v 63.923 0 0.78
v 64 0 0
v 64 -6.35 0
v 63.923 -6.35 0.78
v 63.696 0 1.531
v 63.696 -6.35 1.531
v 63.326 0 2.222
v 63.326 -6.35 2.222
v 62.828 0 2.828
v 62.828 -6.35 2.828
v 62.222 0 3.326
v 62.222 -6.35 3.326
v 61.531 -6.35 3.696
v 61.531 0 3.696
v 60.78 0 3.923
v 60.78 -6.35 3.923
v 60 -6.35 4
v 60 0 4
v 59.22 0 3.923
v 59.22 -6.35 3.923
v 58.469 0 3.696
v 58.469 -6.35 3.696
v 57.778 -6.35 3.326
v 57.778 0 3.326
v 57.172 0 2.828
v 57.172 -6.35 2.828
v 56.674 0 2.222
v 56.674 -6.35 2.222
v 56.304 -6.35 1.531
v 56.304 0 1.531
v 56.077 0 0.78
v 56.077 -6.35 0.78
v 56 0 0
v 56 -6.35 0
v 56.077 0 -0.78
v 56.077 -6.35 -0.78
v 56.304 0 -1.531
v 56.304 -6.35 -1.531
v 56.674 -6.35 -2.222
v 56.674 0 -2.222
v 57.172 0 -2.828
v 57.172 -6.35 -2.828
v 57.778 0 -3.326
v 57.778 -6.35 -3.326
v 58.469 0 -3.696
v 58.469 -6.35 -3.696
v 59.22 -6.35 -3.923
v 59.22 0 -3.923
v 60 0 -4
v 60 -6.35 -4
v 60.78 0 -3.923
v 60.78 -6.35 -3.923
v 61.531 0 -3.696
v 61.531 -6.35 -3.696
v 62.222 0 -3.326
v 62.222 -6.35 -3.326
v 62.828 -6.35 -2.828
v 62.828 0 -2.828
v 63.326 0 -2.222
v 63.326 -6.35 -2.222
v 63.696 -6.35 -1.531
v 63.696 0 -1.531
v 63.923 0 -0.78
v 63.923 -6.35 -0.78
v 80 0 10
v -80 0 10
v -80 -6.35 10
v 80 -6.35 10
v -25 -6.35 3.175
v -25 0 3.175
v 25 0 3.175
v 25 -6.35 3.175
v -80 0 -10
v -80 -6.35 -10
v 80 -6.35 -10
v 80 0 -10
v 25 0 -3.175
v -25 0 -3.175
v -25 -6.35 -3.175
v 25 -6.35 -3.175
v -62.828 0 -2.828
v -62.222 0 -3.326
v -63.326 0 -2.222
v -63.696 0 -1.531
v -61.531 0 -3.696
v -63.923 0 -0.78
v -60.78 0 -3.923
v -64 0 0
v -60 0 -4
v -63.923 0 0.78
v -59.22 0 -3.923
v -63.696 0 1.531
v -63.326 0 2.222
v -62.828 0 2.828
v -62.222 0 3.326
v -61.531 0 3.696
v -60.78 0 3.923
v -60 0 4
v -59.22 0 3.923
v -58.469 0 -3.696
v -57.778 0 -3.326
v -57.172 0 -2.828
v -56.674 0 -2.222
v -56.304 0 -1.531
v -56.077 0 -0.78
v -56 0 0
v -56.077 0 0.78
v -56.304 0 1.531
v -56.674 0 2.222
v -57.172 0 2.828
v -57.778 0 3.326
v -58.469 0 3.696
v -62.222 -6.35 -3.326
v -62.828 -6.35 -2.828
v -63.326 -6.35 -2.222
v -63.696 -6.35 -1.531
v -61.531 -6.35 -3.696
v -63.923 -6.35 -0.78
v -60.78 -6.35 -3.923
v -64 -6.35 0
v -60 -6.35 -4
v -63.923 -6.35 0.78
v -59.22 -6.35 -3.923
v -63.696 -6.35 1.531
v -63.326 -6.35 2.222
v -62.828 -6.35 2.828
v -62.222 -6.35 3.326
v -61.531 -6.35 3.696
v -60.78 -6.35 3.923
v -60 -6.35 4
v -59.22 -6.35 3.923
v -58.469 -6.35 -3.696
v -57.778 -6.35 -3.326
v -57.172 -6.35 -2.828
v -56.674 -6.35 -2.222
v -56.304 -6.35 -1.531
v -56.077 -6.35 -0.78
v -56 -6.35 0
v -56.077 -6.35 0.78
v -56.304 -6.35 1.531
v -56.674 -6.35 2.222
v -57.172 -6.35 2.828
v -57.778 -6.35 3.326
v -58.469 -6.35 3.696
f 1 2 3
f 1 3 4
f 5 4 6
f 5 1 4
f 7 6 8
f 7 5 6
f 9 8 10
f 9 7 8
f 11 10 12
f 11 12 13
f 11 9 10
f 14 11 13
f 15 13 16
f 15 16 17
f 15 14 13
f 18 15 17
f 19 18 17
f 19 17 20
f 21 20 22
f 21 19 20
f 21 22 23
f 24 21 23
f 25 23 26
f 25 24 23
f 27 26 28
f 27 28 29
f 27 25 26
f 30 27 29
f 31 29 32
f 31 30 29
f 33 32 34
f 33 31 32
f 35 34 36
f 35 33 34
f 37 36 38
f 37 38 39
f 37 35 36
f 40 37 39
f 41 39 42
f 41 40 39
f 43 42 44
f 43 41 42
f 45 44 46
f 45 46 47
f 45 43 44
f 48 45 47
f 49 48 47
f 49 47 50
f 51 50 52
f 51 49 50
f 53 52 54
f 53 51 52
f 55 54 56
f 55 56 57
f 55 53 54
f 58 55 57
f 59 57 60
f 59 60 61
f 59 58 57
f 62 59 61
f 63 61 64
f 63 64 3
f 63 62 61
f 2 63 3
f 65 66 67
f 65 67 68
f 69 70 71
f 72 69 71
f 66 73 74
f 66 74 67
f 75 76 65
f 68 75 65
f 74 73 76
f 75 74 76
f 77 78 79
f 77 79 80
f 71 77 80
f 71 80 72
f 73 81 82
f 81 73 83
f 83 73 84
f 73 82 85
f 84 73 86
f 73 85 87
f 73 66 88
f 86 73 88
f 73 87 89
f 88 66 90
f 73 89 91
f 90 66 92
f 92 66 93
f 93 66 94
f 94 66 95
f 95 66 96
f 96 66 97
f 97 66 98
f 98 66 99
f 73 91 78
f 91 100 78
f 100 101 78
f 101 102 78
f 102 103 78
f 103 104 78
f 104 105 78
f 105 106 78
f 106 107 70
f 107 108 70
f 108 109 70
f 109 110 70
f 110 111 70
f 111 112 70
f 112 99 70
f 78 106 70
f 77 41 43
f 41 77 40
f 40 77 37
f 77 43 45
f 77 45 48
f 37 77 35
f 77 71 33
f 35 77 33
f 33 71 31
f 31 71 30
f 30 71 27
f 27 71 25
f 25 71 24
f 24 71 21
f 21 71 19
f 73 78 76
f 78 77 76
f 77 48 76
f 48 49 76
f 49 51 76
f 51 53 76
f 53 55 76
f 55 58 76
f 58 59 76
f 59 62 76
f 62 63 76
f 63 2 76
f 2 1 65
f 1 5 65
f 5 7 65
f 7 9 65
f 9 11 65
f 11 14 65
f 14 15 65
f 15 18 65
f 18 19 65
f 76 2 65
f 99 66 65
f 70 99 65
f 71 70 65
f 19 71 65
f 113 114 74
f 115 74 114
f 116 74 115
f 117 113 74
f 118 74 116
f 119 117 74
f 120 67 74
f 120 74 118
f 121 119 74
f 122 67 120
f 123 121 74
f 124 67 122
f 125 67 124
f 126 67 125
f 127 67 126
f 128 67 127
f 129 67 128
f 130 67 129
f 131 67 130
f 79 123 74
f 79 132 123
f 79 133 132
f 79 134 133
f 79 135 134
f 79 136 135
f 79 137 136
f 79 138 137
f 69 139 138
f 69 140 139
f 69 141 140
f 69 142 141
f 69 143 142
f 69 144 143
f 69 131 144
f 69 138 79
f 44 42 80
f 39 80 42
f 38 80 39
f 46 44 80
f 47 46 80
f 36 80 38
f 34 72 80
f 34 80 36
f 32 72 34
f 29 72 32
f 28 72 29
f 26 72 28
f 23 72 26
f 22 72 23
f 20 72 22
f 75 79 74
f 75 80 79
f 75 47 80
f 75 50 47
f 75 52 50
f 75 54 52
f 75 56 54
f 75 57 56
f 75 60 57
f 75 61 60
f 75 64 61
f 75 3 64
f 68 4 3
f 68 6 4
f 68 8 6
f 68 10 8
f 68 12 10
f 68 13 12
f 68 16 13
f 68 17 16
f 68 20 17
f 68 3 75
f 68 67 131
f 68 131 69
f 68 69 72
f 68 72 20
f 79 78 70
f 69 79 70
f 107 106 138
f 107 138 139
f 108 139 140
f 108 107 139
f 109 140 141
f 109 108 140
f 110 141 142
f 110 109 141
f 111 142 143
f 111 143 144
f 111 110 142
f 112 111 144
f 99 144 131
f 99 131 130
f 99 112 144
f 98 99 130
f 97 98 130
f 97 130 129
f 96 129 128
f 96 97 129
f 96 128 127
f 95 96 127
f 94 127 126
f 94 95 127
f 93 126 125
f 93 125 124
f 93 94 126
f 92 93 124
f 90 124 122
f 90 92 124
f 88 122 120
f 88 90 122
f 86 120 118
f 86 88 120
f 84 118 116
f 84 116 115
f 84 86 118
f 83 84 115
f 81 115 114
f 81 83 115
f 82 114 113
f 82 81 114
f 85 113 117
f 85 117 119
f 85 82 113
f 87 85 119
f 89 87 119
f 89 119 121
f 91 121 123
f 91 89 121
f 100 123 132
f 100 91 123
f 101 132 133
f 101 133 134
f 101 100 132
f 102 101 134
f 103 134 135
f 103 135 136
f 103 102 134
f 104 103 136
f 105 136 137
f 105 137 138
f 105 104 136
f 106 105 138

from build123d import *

# Parameters (mm, degrees)
F0_W     = 160
F0_H     = 20
F0_R     = 4
F0_W_2   = 50
F0_H_2   = 6.35
F1_DEPTH = 6.35


# Not quite as in the source:
# - a length typed as a fraction of an inch, garbled in the dataset ("3 / 203.2 mm" for 3/8 in), is restored


with BuildPart() as f1:
    # F0 (on Front) → F1 (new body)
    with BuildSketch(Plane.XZ):
        Rectangle(F0_W, F0_H)
        with Locations((-60, 0)):
            Circle(F0_R, mode=Mode.SUBTRACT)
        Rectangle(F0_W_2, F0_H_2, mode=Mode.SUBTRACT)
        with Locations((60, 0)):
            Circle(F0_R, mode=Mode.SUBTRACT)
    extrude(amount=F1_DEPTH)


solid = f1.part
